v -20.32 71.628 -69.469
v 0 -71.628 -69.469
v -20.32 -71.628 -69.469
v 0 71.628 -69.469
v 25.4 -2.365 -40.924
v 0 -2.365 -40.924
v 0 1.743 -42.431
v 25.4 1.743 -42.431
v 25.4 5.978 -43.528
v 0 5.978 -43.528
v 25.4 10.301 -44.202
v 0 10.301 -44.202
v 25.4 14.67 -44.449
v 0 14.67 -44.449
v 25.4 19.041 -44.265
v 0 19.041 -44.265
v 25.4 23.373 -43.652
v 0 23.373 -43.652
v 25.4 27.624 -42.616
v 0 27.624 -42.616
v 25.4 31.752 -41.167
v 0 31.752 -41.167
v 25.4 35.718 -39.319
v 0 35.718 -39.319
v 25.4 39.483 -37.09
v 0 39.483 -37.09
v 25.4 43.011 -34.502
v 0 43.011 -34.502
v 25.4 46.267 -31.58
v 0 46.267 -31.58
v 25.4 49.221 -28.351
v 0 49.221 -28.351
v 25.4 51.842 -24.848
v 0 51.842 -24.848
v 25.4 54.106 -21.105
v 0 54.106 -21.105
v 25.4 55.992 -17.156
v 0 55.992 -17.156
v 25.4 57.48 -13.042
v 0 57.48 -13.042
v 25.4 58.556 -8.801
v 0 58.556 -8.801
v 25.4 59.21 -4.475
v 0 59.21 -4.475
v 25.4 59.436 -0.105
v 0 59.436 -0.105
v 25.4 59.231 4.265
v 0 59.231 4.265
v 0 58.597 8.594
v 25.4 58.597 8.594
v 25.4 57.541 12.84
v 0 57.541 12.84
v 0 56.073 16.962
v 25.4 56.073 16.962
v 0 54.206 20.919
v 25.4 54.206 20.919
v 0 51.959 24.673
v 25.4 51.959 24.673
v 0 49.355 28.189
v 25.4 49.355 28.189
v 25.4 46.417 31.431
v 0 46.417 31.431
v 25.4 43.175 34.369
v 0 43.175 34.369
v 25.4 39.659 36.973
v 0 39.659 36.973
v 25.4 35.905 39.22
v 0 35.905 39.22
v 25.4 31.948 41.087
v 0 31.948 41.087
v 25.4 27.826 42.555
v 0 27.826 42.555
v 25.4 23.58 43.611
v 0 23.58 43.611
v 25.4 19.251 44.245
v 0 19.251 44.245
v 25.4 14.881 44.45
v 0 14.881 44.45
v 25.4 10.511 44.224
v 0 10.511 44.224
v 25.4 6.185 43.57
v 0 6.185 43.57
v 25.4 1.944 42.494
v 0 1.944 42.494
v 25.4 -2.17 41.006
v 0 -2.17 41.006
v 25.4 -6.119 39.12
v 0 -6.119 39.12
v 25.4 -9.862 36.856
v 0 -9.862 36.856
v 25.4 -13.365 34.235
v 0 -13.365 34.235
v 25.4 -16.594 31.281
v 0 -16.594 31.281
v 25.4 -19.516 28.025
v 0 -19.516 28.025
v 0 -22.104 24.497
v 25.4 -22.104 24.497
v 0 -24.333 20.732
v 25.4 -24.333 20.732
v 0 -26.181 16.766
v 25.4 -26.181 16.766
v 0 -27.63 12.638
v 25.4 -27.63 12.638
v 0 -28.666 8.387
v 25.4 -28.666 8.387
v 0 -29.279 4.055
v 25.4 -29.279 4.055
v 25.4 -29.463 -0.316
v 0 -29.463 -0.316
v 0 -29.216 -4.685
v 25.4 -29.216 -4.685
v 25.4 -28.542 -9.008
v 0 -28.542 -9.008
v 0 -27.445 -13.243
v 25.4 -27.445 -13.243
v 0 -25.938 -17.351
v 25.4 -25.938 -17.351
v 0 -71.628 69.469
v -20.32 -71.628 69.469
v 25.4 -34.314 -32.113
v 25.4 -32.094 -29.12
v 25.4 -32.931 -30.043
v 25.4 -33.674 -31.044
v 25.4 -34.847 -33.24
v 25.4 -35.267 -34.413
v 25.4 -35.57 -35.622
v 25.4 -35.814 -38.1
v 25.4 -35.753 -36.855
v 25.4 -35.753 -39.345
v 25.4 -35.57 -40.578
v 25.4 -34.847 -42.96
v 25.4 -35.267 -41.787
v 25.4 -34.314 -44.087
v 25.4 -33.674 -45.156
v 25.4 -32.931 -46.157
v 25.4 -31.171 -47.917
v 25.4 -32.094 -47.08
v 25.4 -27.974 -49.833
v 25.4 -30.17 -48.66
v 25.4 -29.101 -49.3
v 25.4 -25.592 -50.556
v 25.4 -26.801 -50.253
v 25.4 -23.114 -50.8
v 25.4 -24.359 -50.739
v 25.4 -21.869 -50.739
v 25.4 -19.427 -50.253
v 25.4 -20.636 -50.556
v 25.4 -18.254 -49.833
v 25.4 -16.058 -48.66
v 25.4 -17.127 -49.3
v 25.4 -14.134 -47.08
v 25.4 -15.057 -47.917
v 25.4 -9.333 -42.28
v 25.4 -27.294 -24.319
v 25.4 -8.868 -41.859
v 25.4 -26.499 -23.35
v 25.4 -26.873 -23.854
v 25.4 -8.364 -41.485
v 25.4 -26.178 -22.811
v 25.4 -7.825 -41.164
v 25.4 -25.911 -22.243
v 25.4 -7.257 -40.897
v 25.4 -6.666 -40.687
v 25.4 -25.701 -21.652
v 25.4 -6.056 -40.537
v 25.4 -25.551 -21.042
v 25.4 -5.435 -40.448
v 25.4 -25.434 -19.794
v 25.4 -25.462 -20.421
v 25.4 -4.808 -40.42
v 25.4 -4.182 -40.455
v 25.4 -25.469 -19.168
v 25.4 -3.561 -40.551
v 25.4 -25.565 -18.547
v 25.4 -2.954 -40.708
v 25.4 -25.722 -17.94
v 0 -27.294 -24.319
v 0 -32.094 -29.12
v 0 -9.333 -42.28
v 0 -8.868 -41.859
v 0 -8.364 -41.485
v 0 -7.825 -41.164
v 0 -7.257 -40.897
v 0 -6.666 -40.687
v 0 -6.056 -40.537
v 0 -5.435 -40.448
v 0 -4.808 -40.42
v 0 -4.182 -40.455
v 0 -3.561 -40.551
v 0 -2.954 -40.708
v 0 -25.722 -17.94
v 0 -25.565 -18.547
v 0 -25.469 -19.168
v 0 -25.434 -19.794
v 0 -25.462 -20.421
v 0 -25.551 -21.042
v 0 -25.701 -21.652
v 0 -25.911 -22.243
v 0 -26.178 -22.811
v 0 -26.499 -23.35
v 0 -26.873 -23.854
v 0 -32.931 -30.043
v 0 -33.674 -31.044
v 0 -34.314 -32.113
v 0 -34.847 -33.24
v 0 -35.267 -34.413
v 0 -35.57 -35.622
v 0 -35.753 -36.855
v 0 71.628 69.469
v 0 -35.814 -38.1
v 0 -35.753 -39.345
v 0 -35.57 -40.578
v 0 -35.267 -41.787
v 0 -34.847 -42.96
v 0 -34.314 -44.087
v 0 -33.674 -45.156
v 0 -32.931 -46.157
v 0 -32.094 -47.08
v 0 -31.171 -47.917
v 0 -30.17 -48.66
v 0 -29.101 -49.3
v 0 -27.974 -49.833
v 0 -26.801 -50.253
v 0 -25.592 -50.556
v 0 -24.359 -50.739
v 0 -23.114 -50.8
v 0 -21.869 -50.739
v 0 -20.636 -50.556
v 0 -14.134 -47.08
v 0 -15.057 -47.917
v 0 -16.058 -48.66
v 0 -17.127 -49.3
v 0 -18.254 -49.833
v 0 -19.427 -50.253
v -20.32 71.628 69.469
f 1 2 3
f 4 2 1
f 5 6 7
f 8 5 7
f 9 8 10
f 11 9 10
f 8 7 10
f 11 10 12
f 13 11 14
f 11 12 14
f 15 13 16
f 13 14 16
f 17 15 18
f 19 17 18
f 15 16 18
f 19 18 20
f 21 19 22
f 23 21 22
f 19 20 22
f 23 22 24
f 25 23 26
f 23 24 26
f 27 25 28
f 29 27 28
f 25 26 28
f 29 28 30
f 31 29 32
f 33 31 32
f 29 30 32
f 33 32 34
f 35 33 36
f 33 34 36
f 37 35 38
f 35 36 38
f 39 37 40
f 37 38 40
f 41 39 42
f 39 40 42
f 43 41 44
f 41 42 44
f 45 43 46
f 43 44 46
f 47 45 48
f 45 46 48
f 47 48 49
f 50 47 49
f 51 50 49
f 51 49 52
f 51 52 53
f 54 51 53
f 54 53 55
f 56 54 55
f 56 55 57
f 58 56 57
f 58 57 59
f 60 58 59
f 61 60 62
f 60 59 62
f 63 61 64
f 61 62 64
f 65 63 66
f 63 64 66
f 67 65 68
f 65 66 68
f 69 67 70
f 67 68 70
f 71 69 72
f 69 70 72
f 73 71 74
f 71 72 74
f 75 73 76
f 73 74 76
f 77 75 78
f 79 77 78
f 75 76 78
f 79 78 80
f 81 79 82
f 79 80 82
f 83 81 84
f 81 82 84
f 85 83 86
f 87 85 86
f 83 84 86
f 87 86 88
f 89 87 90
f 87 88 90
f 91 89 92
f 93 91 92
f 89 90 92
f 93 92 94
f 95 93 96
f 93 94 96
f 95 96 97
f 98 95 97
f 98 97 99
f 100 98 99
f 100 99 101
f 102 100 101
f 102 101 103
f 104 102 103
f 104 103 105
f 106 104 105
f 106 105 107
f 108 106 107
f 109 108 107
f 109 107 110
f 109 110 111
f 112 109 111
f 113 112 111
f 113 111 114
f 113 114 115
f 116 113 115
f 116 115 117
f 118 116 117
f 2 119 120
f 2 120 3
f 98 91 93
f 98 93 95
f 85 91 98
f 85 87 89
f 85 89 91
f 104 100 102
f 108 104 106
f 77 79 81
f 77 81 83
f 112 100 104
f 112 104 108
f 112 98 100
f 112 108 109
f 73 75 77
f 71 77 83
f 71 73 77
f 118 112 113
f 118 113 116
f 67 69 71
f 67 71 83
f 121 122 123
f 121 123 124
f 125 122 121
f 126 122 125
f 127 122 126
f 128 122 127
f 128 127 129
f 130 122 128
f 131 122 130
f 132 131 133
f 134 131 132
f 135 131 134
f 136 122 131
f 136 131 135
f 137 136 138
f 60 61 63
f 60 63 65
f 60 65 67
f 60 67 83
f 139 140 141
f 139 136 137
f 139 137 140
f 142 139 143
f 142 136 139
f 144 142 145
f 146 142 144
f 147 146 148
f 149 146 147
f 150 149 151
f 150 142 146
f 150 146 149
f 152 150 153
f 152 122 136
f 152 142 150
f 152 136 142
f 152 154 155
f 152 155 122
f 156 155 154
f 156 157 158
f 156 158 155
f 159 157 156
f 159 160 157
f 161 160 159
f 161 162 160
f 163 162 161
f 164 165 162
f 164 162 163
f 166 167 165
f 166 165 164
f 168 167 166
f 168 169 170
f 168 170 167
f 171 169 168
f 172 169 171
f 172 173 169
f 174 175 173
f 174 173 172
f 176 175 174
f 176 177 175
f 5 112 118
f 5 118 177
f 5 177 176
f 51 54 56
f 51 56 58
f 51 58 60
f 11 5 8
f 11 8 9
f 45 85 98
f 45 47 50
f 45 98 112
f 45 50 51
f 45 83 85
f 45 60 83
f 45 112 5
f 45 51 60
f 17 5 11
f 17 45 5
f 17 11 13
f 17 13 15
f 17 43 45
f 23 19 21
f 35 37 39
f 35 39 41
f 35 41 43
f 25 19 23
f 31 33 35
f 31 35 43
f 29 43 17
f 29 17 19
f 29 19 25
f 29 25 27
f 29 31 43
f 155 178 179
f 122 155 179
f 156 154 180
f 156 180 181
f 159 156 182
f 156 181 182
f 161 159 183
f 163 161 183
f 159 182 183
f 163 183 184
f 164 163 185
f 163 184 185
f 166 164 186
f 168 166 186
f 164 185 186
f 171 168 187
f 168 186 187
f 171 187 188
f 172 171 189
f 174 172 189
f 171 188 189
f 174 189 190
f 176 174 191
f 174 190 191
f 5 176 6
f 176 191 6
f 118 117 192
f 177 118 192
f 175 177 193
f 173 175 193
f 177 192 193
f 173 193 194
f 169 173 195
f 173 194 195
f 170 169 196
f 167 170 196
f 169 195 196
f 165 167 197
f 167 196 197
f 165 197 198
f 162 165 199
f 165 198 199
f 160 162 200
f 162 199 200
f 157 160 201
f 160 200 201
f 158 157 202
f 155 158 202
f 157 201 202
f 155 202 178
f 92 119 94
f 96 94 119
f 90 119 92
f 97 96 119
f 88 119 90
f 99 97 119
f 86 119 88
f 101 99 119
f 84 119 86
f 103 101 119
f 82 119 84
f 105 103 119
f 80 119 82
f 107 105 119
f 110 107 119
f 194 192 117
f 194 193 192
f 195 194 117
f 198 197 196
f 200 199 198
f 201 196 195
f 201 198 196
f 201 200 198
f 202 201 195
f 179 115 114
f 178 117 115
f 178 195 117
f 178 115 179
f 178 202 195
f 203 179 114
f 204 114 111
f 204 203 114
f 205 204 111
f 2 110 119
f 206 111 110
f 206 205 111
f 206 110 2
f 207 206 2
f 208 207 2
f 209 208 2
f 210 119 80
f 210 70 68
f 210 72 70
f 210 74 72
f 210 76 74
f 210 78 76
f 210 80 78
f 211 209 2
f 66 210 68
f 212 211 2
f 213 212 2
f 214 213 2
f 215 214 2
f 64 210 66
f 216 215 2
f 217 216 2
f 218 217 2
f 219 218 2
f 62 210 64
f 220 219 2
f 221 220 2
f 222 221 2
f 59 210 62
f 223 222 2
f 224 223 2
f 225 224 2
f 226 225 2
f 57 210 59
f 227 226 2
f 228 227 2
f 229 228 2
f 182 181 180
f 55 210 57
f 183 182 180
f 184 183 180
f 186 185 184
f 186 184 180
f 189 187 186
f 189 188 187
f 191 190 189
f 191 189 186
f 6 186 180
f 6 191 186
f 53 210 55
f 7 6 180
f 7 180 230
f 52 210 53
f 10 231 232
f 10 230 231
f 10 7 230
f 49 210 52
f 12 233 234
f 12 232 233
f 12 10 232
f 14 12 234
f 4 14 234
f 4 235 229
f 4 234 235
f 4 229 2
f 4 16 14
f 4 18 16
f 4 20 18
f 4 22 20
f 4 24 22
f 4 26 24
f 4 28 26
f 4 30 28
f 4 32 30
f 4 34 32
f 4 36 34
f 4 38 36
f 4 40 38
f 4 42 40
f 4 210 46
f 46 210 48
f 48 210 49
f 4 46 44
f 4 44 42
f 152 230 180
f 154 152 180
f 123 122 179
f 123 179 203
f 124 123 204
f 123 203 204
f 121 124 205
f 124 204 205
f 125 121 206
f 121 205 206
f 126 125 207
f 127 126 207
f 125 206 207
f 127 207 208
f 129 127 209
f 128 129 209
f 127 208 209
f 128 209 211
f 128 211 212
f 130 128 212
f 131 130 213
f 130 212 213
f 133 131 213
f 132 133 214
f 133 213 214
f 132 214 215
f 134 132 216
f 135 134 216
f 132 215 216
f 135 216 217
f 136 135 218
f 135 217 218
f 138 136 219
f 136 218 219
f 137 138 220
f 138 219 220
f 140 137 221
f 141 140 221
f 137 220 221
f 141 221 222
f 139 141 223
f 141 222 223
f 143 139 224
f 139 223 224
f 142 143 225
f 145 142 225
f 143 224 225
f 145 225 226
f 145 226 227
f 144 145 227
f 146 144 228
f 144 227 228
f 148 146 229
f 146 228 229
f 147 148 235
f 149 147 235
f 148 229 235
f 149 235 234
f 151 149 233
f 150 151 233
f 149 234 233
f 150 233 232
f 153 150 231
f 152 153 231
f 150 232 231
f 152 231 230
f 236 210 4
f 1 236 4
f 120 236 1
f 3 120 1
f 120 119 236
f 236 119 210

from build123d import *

# Parameters (mm, degrees)
SKETCH1_W           = 138.938
SKETCH1_H           = 143.256
BOSS_EXTRUDE1_DEPTH = 20.32
BOSS_EXTRUDE2_DEPTH = 25.4


with BuildPart() as part:
    # Sketch1 → Boss-Extrude1 (new body)
    with BuildSketch(Plane(origin=(0, 0, 0), x_dir=(0, 0, -1), z_dir=(1, 0, 0))):
        Rectangle(SKETCH1_W, SKETCH1_H)
    extrude(amount=-BOSS_EXTRUDE1_DEPTH)

    # Sketch2 → Boss-Extrude2 (add)
    with BuildSketch(Plane(origin=(0, 0, 0), x_dir=(0, 0, -1), z_dir=(1, 0, 0))):
        with BuildLine():
            Line((47.080256121, -14.133743879), (42.27993705, -9.333424808))
            ThreePointArc((42.27993705, -9.333424808), (40.536989709, -6.056256364), (40.923806972, -2.364634654))
            ThreePointArc((40.923806972, -2.364634654), (-31.430896424, 46.416896424), (17.350634654, -25.937806972))
            ThreePointArc((17.350634654, -25.937806972), (21.042256364, -25.550989709), (24.319424808, -27.29393705))
            Line((24.319424808, -27.29393705), (29.119743879, -32.094256121))
            ThreePointArc((29.119743879, -32.094256121), (47.080256121, -32.094256121), (47.080256121, -14.133743879))
        make_face()
    extrude(amount=BOSS_EXTRUDE2_DEPTH)


solid = part.part
